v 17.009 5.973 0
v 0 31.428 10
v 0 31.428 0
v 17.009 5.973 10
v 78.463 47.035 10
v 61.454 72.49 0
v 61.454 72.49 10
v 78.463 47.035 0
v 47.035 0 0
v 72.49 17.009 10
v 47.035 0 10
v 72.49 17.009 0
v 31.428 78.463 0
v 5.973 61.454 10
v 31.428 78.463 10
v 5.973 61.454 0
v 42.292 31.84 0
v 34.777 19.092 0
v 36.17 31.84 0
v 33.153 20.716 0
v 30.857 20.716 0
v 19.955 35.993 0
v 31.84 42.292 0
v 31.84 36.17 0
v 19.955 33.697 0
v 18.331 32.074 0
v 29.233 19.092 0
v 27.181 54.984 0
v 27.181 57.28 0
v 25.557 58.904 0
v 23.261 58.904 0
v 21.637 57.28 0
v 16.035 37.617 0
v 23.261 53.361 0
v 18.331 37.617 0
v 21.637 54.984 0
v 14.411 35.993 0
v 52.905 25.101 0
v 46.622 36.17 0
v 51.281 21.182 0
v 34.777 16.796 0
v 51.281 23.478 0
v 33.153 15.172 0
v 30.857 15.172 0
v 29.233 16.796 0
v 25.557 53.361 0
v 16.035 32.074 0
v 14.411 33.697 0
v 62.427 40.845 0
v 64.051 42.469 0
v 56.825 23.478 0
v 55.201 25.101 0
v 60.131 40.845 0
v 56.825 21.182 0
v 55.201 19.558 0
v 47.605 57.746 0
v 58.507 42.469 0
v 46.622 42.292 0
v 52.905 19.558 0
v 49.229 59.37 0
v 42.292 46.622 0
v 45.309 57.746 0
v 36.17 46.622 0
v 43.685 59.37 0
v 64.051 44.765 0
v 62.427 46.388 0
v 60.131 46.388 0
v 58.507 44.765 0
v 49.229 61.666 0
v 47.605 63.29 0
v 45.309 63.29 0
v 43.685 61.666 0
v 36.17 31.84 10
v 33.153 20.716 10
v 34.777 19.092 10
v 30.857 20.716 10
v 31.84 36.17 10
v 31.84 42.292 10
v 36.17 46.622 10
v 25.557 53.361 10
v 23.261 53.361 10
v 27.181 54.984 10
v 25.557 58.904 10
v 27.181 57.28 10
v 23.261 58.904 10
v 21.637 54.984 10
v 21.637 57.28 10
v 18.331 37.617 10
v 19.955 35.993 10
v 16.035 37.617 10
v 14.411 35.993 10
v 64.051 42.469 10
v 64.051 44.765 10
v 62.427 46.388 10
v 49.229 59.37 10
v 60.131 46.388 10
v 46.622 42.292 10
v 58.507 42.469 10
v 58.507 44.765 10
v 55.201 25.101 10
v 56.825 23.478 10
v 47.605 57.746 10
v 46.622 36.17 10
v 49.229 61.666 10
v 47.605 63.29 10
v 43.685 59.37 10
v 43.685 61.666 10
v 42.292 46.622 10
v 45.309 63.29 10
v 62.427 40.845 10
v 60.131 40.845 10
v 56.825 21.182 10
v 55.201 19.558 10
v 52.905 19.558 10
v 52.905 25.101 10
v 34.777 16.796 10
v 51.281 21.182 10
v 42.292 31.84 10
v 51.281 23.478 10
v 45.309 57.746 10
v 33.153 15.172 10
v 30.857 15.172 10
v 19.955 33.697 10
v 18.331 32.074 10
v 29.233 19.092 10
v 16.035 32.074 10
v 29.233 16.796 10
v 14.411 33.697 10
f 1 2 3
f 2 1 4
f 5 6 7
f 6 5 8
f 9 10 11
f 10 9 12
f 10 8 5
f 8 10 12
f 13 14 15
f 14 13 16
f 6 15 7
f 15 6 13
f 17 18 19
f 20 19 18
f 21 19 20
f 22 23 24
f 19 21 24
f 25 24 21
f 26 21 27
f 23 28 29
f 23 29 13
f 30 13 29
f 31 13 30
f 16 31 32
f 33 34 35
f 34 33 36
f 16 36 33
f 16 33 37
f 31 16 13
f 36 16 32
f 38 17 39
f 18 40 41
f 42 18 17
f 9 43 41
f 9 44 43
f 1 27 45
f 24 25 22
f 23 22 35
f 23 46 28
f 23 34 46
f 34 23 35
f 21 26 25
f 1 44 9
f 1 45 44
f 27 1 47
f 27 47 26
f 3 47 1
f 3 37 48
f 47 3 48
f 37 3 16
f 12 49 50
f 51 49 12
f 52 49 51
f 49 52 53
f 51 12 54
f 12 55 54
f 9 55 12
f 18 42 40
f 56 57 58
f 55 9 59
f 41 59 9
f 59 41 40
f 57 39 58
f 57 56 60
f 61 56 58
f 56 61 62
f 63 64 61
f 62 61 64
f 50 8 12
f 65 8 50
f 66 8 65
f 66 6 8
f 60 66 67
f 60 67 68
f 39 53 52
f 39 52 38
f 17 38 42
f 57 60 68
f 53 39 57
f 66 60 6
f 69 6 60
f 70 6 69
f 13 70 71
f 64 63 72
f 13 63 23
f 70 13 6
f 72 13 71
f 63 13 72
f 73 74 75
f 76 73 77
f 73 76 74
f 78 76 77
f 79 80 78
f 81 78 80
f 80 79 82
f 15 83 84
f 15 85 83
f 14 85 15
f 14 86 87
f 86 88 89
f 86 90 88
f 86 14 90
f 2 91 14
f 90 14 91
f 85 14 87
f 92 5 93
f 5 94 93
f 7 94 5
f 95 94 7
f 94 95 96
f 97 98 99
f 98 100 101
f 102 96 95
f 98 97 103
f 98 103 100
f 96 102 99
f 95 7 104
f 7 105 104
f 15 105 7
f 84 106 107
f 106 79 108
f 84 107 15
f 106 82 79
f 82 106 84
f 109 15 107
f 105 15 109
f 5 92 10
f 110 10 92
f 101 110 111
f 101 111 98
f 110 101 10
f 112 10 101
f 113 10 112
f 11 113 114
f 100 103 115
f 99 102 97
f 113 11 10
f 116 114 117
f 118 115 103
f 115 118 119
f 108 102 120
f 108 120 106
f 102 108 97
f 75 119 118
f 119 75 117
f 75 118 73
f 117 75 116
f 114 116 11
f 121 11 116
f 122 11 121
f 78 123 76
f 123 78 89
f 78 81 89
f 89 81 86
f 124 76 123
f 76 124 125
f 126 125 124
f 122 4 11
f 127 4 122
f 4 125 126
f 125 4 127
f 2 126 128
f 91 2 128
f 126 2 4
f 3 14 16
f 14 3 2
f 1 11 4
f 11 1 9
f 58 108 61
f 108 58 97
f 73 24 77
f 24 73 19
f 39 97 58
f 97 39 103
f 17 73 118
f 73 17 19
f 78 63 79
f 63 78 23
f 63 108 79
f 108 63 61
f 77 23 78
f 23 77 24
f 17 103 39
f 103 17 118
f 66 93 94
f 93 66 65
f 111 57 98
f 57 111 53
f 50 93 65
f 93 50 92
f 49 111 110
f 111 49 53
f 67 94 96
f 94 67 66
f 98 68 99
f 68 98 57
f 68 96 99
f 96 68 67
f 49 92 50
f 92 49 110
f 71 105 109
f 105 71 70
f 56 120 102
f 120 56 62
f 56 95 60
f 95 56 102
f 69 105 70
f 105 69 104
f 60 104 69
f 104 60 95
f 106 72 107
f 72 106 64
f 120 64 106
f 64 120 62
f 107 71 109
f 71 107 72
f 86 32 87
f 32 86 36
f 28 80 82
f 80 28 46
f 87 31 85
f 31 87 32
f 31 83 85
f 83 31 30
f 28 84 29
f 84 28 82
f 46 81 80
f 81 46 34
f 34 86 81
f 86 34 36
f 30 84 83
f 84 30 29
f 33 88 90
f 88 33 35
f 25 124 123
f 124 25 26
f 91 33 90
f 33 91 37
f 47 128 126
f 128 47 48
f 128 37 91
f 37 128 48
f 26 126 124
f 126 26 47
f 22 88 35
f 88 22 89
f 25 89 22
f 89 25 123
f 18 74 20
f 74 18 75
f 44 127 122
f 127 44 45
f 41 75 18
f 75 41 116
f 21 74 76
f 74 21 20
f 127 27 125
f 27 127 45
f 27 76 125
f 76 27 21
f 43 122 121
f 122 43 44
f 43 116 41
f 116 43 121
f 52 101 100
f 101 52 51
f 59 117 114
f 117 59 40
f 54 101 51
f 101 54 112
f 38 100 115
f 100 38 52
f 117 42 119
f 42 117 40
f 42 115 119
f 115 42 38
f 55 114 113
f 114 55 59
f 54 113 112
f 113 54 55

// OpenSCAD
$fn = 32;

// ----------------------------------------------------------------------
// Polygon plate: 8-gon R40, 6 bolt windows
// ----------------------------------------------------------------------

// --- parameters (mm) ---
sides = 8;                // number of polygon sides
plate_r = 40;             // circumscribed radius of the polygon
bore_r = 8;               // centre bore radius
bolts = 6;                // number of bolt windows
ring_r = 22.48;           // bolt-circle radius
bolt_r = 3;               // bolt window radius
plate_t = 10;             // plate thickness, Z (extrusion height)
fit_tol = 0.02;           // declared fit tolerance (prompt contract)
free_tol = 0.2;           // declared free tolerance (prompt contract)

plate_d = 2 * plate_r;  // circumscribed diameter
bore_d = 2 * bore_r;  // centre bore diameter
bolt_d = 2 * bolt_r;  // bolt window diameter
ring_d = 2 * ring_r;  // bolt-circle diameter

profile = [[78.463, 47.035], [61.454, 72.49], [31.428, 78.463], [5.973, 61.454], [0, 31.428], [17.009, 5.973], [47.035, 0], [72.49, 17.009]];  // primary outline, 8 points, counter clockwise
void_1 = [[46.622, 42.292], [42.292, 46.622], [36.17, 46.622], [31.84, 42.292], [31.84, 36.17], [36.17, 31.84], [42.292, 31.84], [46.622, 36.17]];  // centre bore, 8 points
void_2 = [[64.051, 44.765], [62.427, 46.388], [60.131, 46.388], [58.507, 44.765], [58.507, 42.469], [60.131, 40.845], [62.427, 40.845], [64.051, 42.469]];  // bolt window 1, 8 points
void_3 = [[49.229, 61.666], [47.605, 63.29], [45.309, 63.29], [43.685, 61.666], [43.685, 59.37], [45.309, 57.746], [47.605, 57.746], [49.229, 59.37]];  // bolt window 2, 8 points
void_4 = [[27.181, 57.28], [25.557, 58.904], [23.261, 58.904], [21.637, 57.28], [21.637, 54.984], [23.261, 53.361], [25.557, 53.361], [27.181, 54.984]];  // bolt window 3, 8 points
void_5 = [[19.955, 35.993], [18.331, 37.617], [16.035, 37.617], [14.411, 35.993], [14.411, 33.697], [16.035, 32.074], [18.331, 32.074], [19.955, 33.697]];  // bolt window 4, 8 points
void_6 = [[34.777, 19.092], [33.153, 20.716], [30.857, 20.716], [29.233, 19.092], [29.233, 16.796], [30.857, 15.172], [33.153, 15.172], [34.777, 16.796]];  // bolt window 5, 8 points
void_7 = [[56.825, 23.478], [55.201, 25.101], [52.905, 25.101], [51.281, 23.478], [51.281, 21.182], [52.905, 19.558], [55.201, 19.558], [56.825, 21.182]];  // bolt window 6, 8 points

// --- the one profile operation ---
difference() {
  linear_extrude(height = plate_t) polygon(points = profile);
  translate([0, 0, -1])
    linear_extrude(height = plate_t + 2) polygon(points = void_1);
  translate([0, 0, -1])
    linear_extrude(height = plate_t + 2) polygon(points = void_2);
  translate([0, 0, -1])
    linear_extrude(height = plate_t + 2) polygon(points = void_3);
  translate([0, 0, -1])
    linear_extrude(height = plate_t + 2) polygon(points = void_4);
  translate([0, 0, -1])
    linear_extrude(height = plate_t + 2) polygon(points = void_5);
  translate([0, 0, -1])
    linear_extrude(height = plate_t + 2) polygon(points = void_6);
  translate([0, 0, -1])
    linear_extrude(height = plate_t + 2) polygon(points = void_7);
}
